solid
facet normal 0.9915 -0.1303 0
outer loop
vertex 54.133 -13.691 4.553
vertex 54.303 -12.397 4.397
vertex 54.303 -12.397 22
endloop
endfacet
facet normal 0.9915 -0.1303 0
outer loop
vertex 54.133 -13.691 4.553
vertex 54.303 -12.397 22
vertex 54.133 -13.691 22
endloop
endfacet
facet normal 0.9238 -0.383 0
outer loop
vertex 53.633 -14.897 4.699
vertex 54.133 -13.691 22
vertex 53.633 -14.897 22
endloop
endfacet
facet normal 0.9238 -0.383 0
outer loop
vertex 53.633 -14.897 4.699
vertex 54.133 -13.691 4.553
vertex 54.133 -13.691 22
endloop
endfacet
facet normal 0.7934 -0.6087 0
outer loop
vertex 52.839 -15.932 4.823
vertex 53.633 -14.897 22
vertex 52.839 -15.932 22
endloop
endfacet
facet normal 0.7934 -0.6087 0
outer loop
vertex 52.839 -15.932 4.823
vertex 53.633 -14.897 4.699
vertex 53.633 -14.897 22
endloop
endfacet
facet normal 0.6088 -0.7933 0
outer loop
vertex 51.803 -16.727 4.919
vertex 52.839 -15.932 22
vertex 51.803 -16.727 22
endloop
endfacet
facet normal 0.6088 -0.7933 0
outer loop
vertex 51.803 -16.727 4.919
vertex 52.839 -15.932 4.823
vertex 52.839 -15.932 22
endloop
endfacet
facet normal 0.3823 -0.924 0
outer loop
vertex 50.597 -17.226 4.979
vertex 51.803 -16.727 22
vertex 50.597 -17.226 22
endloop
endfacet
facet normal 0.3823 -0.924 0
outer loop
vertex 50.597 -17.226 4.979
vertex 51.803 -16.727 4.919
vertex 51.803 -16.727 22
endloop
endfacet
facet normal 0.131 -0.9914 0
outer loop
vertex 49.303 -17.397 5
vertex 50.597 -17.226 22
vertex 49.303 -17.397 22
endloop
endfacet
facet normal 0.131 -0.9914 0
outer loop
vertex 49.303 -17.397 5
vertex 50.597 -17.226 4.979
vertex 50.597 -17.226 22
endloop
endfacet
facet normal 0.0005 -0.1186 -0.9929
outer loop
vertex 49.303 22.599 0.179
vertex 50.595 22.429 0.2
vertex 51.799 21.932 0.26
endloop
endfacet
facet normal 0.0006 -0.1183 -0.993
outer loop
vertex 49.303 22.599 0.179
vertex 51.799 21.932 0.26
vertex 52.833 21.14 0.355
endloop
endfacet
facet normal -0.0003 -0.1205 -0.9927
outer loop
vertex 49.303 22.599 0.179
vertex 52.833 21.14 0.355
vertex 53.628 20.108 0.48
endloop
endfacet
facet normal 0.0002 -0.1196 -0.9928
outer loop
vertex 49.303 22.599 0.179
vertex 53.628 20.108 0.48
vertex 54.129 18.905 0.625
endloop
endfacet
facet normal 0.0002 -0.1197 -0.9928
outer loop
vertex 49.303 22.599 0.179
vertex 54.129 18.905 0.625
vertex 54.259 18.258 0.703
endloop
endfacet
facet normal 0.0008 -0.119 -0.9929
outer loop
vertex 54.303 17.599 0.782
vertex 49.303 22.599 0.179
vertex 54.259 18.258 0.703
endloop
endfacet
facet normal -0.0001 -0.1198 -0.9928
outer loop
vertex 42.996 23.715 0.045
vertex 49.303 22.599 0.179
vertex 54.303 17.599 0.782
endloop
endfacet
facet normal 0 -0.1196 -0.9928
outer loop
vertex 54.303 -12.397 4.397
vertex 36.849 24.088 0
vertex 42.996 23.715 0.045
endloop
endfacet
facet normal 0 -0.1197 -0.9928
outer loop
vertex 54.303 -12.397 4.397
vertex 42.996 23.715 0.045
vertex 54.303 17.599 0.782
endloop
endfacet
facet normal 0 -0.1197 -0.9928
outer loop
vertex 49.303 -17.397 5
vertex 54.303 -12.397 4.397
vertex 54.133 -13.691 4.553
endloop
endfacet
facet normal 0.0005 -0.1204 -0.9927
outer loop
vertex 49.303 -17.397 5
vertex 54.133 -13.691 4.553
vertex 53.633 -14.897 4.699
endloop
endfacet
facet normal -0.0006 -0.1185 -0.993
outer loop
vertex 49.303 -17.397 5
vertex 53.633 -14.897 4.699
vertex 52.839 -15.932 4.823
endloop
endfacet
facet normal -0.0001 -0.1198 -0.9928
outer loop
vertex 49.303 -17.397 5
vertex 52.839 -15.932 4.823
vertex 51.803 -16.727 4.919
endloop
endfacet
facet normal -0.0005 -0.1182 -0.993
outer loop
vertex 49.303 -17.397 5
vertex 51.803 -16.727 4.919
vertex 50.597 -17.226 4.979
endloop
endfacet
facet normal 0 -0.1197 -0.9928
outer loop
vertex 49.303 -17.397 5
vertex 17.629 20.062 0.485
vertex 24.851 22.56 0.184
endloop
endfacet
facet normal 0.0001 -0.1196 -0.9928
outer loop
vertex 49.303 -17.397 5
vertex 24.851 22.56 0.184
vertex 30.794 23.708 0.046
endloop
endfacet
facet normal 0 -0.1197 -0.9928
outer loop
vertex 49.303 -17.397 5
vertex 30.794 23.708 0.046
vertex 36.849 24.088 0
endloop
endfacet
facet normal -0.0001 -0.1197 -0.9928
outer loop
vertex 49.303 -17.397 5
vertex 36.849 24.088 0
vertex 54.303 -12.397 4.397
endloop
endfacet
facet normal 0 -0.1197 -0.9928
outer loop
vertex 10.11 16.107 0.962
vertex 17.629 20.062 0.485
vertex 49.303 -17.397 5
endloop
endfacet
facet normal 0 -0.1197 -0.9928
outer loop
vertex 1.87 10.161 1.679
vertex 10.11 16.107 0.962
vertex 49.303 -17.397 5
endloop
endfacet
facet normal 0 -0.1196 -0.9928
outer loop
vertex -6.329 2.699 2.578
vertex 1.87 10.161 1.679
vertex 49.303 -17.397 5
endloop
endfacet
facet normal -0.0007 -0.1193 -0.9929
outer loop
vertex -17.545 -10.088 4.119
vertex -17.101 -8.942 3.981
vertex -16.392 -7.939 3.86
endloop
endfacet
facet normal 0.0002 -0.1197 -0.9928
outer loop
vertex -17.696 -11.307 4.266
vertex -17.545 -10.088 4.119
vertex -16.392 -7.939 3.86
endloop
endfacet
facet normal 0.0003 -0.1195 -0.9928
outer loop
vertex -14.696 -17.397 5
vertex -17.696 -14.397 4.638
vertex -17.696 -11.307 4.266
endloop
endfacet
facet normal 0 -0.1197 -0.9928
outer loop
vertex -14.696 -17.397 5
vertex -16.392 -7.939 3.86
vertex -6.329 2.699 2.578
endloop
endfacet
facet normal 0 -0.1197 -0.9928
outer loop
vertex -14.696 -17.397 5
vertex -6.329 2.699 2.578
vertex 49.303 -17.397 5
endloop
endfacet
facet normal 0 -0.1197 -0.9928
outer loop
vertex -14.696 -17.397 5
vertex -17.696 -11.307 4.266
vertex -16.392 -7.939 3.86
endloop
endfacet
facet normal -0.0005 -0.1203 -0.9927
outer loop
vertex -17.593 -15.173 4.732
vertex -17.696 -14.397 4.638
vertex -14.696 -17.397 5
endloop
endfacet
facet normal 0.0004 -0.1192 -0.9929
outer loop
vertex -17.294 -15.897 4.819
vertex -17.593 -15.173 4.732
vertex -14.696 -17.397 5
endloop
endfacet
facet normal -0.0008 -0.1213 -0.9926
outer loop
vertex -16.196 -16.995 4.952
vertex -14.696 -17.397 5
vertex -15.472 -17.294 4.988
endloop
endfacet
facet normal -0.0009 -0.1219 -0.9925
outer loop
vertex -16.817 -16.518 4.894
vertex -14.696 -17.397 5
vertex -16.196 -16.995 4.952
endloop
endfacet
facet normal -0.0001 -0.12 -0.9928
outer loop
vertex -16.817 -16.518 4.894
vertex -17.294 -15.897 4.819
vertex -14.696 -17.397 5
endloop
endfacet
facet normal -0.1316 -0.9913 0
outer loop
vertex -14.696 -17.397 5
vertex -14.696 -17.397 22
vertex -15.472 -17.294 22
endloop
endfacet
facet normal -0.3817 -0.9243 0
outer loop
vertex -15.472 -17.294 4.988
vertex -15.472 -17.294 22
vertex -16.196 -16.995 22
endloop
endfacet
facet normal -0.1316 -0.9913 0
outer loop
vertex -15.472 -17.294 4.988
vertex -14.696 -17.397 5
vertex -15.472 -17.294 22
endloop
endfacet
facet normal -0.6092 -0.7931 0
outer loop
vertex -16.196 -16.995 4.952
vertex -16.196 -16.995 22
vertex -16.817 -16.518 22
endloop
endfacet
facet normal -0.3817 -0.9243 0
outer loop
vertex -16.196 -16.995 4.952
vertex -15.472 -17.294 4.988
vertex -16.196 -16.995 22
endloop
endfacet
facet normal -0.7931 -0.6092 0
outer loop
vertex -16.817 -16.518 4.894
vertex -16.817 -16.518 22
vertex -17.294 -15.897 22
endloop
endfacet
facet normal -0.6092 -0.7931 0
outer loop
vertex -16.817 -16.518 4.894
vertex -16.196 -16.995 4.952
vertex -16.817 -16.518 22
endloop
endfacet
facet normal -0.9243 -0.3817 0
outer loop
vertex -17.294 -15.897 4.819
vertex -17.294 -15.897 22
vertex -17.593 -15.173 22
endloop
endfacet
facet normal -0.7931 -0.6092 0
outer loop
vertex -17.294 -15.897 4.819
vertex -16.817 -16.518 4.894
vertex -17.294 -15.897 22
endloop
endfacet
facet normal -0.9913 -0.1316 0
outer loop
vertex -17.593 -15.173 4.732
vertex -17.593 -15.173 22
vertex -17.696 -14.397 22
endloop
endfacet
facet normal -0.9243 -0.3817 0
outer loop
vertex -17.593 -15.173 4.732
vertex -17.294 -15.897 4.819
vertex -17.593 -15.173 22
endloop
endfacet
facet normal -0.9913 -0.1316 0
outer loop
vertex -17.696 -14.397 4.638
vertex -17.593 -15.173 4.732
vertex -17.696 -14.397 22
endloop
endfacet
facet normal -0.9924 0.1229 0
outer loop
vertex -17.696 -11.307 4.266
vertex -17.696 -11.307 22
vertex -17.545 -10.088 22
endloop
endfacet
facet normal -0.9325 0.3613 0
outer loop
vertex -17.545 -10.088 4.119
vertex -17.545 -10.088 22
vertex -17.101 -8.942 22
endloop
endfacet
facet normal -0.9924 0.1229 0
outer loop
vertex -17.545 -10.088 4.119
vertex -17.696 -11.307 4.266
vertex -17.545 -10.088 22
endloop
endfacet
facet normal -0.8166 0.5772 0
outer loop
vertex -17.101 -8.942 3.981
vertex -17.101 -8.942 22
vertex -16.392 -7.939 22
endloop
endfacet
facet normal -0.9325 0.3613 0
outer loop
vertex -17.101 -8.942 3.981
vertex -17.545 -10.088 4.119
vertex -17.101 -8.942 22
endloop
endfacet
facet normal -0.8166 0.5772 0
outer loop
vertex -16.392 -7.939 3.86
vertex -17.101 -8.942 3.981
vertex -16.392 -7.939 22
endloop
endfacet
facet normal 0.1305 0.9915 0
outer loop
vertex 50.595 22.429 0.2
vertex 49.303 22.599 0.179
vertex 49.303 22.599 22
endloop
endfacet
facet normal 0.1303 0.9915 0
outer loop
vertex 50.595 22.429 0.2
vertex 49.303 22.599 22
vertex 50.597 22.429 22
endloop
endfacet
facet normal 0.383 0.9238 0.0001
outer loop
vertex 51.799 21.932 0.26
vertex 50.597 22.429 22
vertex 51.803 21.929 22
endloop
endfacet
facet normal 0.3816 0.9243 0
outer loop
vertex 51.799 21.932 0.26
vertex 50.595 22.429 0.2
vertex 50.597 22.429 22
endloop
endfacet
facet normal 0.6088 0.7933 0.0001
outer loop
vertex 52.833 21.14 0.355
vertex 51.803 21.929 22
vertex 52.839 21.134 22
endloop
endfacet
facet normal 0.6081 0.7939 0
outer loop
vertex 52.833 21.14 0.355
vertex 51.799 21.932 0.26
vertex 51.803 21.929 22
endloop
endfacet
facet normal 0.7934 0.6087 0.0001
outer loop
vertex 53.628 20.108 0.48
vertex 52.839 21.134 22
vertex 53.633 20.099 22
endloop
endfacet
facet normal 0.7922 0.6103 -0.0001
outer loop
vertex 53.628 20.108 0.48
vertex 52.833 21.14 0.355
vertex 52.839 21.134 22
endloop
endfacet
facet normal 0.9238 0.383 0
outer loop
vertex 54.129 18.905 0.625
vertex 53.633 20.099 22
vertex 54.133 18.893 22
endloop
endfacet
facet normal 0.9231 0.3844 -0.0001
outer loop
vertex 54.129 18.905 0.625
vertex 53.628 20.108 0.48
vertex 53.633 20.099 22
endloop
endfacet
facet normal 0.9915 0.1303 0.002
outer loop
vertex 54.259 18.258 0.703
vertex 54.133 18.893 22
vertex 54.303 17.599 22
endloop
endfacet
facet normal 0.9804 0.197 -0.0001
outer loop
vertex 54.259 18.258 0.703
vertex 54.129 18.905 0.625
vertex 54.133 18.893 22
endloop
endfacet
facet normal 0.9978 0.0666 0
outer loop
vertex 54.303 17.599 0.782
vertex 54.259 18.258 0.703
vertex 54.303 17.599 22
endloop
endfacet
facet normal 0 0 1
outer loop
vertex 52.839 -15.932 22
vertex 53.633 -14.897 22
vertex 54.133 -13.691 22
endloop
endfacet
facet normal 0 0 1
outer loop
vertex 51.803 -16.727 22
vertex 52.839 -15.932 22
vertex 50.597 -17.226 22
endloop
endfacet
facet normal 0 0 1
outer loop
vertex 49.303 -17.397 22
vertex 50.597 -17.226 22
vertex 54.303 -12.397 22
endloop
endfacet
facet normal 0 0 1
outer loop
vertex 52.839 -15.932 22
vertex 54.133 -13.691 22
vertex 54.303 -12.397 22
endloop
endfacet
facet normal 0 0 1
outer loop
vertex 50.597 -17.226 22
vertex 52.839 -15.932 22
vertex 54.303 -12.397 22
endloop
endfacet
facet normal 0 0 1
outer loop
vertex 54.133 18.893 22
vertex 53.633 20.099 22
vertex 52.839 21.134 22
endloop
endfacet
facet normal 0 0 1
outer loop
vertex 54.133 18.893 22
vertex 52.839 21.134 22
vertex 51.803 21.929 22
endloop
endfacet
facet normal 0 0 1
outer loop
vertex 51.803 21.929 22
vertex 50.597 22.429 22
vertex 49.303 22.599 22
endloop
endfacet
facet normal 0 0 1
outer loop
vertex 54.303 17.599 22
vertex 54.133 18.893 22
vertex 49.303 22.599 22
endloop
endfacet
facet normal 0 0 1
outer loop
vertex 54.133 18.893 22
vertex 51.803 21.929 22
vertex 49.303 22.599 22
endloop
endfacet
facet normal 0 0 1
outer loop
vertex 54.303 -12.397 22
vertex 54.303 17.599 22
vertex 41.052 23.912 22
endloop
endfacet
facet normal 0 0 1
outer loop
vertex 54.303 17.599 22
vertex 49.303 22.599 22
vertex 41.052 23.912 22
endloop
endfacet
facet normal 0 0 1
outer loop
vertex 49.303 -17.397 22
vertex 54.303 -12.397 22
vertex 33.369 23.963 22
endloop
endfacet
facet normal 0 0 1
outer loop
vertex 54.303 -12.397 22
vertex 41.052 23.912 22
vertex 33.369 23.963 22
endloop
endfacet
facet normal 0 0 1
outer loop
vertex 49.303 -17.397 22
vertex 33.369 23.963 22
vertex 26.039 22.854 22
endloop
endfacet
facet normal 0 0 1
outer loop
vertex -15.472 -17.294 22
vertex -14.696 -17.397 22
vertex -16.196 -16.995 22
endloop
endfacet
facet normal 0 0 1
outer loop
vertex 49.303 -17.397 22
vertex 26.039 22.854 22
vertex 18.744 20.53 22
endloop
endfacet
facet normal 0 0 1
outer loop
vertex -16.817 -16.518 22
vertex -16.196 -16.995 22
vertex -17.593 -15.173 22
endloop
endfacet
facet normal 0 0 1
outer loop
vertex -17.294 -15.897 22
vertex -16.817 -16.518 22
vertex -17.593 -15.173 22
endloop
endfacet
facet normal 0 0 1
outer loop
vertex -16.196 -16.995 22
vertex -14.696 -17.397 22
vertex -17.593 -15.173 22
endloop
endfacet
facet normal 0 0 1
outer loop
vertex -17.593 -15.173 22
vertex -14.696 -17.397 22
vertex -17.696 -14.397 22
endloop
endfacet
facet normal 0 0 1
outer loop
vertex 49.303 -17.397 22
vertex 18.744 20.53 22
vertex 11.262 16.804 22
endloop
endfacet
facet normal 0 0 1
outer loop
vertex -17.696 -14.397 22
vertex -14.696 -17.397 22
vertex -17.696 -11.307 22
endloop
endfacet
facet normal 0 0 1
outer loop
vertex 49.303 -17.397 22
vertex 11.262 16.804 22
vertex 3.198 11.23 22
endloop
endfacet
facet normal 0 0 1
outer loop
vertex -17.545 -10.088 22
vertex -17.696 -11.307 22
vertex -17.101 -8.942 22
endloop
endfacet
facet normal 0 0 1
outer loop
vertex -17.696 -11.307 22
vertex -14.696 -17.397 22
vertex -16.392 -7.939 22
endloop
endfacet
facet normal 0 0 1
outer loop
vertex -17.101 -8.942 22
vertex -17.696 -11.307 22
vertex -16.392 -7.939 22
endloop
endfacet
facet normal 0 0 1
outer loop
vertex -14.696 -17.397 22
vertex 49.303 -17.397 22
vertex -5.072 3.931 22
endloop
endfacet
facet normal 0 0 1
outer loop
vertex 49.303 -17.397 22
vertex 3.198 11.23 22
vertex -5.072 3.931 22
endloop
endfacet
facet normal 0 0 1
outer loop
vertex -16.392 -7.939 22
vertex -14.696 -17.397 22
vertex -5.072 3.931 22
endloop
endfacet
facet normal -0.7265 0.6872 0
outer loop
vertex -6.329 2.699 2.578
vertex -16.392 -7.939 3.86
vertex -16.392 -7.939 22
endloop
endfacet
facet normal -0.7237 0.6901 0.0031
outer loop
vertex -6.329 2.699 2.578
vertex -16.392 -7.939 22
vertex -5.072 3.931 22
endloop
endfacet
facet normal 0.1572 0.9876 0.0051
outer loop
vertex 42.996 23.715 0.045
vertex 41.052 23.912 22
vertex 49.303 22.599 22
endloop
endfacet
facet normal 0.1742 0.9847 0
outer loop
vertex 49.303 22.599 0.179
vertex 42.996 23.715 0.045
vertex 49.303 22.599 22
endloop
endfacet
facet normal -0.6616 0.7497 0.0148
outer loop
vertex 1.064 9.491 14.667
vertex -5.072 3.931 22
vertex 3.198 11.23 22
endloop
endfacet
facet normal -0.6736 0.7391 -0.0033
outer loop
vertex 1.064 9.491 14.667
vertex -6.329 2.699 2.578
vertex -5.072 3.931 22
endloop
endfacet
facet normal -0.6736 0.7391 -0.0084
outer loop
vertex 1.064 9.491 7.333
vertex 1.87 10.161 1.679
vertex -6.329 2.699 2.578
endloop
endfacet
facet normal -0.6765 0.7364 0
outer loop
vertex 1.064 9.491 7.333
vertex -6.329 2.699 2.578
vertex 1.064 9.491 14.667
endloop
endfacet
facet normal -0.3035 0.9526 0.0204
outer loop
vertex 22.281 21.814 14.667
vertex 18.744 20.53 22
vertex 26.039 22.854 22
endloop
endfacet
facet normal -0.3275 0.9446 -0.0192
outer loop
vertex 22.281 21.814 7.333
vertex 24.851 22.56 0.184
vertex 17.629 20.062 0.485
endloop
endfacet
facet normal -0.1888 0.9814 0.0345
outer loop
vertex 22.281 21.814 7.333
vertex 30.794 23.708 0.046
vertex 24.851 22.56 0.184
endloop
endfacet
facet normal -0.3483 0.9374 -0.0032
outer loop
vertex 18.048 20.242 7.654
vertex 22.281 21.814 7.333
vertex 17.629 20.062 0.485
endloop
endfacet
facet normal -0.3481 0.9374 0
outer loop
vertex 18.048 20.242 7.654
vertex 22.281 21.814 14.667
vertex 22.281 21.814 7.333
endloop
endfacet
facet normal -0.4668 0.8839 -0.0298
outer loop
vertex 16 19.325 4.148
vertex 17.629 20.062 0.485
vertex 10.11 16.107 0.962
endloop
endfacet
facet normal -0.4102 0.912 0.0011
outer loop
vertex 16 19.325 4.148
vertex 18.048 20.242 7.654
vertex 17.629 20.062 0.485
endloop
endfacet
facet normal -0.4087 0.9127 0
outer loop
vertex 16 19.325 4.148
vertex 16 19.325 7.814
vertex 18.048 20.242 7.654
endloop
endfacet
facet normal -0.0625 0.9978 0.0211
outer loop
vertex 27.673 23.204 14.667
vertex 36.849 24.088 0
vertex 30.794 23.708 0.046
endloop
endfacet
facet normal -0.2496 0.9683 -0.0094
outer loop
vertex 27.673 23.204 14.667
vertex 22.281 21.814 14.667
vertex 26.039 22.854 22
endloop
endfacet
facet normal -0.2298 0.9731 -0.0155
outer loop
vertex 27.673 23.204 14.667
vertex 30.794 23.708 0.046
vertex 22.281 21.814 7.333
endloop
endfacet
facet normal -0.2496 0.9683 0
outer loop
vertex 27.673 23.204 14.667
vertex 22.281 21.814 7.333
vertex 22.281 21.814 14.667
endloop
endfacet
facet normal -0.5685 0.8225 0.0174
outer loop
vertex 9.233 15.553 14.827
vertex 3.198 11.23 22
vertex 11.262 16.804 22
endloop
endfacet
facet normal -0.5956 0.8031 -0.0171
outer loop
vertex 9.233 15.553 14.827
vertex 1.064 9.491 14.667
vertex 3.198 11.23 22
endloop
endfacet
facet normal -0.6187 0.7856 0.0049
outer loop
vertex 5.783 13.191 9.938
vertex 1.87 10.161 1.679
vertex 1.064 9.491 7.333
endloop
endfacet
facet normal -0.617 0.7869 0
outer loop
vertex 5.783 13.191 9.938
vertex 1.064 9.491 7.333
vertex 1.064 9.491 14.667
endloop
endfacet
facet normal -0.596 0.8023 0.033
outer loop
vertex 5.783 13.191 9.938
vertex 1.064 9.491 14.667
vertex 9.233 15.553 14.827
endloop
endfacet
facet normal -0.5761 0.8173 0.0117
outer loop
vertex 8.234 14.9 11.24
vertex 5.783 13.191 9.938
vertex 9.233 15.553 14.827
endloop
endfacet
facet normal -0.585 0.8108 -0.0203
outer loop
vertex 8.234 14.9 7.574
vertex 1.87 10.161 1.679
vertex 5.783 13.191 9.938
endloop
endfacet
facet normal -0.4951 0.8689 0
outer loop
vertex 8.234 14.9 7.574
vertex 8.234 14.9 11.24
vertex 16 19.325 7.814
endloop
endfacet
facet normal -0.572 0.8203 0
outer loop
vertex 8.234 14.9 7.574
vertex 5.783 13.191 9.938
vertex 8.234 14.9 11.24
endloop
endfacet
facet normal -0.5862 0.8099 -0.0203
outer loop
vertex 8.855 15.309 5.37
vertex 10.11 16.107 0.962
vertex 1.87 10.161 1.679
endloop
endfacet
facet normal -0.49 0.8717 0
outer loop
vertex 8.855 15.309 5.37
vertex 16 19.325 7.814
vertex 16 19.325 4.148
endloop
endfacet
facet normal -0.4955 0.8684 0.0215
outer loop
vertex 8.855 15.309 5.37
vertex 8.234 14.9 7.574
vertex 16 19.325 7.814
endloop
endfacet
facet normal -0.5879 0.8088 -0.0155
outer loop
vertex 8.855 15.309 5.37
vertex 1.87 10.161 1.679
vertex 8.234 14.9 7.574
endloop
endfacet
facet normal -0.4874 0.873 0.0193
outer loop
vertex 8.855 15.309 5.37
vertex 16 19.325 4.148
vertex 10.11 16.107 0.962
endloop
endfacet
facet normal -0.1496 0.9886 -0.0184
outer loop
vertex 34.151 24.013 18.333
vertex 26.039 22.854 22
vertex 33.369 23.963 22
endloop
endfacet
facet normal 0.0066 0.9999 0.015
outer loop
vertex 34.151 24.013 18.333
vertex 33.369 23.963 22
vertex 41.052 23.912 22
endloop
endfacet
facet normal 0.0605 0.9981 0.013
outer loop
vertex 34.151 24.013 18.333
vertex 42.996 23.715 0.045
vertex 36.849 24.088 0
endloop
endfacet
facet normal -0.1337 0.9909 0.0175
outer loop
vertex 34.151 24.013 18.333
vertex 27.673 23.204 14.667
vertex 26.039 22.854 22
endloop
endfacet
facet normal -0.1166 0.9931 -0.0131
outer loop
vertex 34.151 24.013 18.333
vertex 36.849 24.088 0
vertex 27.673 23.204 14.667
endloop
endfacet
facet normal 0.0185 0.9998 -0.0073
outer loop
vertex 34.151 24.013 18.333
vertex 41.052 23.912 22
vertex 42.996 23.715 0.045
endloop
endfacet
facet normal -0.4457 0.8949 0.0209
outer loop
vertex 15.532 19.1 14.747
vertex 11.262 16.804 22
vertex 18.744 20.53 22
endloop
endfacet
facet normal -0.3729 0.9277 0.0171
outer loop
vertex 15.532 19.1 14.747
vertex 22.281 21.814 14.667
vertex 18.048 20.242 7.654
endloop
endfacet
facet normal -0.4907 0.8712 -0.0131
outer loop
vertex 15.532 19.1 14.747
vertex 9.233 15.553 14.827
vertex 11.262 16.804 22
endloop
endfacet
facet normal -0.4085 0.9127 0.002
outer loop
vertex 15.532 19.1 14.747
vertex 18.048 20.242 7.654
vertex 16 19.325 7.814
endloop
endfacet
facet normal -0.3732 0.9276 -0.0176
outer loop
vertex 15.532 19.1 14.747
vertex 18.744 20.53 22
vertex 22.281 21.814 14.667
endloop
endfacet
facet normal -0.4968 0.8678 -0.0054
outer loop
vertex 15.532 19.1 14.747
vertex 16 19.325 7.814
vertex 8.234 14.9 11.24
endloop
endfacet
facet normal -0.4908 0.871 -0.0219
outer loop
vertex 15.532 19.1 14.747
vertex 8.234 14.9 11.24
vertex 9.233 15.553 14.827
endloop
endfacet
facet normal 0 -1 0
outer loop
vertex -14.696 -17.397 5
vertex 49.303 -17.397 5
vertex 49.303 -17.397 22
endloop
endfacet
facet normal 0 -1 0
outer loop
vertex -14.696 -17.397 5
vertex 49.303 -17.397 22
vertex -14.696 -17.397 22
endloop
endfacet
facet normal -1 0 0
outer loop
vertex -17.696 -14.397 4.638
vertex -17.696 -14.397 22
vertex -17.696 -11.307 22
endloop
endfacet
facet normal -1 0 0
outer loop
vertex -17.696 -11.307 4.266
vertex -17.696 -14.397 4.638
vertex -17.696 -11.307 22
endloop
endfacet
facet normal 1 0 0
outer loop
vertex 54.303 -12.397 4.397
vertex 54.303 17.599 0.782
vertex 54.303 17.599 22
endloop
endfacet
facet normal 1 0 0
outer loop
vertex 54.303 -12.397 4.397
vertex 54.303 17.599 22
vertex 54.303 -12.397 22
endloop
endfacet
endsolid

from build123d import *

# Parameters (mm, degrees)
BOSS_EXTRUDE1_DEPTH     = 22
CUT_EXTRUDE3_DEPTH      = 64.348491393
CUT_EXTRUDE3_DEPTH_BACK = 64.348491393


with BuildPart() as part:
    # Sketch1 → Boss-Extrude1 (new body)
    with BuildSketch(Plane.XY):
        with BuildLine():
            Line((54.303030303, 17.598954753), (54.303030303, -12.396681203))
            ThreePointArc((54.303030303, -12.396681203), (52.838564209, -15.932215109), (49.303030303, -17.396681203))
            Line((49.303030303, -17.396681203), (-14.695644242, -17.396681203))
            ThreePointArc((-14.695644242, -17.396681203), (-16.816964585, -16.518001547), (-17.695644242, -14.396681203))
            Line((-17.695644242, -14.396681203), (-17.695644242, -11.306720639))
            ThreePointArc((-17.695644242, -11.306720639), (-17.35823549, -9.50110638), (-16.3915471, -7.939184142))
            add(Edge.make_bspline(
                [(-16.3915471, -7.939184142), (-0.135926549, 9.901511722), (18.69690639, 29.725737375), (49.303030303, 22.598954753)],
                knots=[0.026299547, 0.026299547, 0.026299547, 0.026299547, 1, 1, 1, 1], degree=3))
            ThreePointArc((49.303030303, 22.598954753), (52.838564209, 21.134488659), (54.303030303, 17.598954753))
        make_face()
    extrude(amount=BOSS_EXTRUDE1_DEPTH)

    # Sketch3 → Cut-Extrude3 (cut, two sides: drawn at the far end of the back side and taken through both)
    with BuildSketch(Plane(origin=(0, 0, 0), x_dir=(0, 0, -1), z_dir=(1, 0, 0)).offset(-CUT_EXTRUDE3_DEPTH_BACK)):
        Polygon((12.434475201, 127.254636362), (0, 24.087595181), (-5, -17.396681203), (-17.434475201, -120.563722385), (188.899607163, -145.432672786), (218.768557564, 102.385685961), align=None)
    extrude(amount=CUT_EXTRUDE3_DEPTH + CUT_EXTRUDE3_DEPTH_BACK, mode=Mode.SUBTRACT)


solid = part.part
